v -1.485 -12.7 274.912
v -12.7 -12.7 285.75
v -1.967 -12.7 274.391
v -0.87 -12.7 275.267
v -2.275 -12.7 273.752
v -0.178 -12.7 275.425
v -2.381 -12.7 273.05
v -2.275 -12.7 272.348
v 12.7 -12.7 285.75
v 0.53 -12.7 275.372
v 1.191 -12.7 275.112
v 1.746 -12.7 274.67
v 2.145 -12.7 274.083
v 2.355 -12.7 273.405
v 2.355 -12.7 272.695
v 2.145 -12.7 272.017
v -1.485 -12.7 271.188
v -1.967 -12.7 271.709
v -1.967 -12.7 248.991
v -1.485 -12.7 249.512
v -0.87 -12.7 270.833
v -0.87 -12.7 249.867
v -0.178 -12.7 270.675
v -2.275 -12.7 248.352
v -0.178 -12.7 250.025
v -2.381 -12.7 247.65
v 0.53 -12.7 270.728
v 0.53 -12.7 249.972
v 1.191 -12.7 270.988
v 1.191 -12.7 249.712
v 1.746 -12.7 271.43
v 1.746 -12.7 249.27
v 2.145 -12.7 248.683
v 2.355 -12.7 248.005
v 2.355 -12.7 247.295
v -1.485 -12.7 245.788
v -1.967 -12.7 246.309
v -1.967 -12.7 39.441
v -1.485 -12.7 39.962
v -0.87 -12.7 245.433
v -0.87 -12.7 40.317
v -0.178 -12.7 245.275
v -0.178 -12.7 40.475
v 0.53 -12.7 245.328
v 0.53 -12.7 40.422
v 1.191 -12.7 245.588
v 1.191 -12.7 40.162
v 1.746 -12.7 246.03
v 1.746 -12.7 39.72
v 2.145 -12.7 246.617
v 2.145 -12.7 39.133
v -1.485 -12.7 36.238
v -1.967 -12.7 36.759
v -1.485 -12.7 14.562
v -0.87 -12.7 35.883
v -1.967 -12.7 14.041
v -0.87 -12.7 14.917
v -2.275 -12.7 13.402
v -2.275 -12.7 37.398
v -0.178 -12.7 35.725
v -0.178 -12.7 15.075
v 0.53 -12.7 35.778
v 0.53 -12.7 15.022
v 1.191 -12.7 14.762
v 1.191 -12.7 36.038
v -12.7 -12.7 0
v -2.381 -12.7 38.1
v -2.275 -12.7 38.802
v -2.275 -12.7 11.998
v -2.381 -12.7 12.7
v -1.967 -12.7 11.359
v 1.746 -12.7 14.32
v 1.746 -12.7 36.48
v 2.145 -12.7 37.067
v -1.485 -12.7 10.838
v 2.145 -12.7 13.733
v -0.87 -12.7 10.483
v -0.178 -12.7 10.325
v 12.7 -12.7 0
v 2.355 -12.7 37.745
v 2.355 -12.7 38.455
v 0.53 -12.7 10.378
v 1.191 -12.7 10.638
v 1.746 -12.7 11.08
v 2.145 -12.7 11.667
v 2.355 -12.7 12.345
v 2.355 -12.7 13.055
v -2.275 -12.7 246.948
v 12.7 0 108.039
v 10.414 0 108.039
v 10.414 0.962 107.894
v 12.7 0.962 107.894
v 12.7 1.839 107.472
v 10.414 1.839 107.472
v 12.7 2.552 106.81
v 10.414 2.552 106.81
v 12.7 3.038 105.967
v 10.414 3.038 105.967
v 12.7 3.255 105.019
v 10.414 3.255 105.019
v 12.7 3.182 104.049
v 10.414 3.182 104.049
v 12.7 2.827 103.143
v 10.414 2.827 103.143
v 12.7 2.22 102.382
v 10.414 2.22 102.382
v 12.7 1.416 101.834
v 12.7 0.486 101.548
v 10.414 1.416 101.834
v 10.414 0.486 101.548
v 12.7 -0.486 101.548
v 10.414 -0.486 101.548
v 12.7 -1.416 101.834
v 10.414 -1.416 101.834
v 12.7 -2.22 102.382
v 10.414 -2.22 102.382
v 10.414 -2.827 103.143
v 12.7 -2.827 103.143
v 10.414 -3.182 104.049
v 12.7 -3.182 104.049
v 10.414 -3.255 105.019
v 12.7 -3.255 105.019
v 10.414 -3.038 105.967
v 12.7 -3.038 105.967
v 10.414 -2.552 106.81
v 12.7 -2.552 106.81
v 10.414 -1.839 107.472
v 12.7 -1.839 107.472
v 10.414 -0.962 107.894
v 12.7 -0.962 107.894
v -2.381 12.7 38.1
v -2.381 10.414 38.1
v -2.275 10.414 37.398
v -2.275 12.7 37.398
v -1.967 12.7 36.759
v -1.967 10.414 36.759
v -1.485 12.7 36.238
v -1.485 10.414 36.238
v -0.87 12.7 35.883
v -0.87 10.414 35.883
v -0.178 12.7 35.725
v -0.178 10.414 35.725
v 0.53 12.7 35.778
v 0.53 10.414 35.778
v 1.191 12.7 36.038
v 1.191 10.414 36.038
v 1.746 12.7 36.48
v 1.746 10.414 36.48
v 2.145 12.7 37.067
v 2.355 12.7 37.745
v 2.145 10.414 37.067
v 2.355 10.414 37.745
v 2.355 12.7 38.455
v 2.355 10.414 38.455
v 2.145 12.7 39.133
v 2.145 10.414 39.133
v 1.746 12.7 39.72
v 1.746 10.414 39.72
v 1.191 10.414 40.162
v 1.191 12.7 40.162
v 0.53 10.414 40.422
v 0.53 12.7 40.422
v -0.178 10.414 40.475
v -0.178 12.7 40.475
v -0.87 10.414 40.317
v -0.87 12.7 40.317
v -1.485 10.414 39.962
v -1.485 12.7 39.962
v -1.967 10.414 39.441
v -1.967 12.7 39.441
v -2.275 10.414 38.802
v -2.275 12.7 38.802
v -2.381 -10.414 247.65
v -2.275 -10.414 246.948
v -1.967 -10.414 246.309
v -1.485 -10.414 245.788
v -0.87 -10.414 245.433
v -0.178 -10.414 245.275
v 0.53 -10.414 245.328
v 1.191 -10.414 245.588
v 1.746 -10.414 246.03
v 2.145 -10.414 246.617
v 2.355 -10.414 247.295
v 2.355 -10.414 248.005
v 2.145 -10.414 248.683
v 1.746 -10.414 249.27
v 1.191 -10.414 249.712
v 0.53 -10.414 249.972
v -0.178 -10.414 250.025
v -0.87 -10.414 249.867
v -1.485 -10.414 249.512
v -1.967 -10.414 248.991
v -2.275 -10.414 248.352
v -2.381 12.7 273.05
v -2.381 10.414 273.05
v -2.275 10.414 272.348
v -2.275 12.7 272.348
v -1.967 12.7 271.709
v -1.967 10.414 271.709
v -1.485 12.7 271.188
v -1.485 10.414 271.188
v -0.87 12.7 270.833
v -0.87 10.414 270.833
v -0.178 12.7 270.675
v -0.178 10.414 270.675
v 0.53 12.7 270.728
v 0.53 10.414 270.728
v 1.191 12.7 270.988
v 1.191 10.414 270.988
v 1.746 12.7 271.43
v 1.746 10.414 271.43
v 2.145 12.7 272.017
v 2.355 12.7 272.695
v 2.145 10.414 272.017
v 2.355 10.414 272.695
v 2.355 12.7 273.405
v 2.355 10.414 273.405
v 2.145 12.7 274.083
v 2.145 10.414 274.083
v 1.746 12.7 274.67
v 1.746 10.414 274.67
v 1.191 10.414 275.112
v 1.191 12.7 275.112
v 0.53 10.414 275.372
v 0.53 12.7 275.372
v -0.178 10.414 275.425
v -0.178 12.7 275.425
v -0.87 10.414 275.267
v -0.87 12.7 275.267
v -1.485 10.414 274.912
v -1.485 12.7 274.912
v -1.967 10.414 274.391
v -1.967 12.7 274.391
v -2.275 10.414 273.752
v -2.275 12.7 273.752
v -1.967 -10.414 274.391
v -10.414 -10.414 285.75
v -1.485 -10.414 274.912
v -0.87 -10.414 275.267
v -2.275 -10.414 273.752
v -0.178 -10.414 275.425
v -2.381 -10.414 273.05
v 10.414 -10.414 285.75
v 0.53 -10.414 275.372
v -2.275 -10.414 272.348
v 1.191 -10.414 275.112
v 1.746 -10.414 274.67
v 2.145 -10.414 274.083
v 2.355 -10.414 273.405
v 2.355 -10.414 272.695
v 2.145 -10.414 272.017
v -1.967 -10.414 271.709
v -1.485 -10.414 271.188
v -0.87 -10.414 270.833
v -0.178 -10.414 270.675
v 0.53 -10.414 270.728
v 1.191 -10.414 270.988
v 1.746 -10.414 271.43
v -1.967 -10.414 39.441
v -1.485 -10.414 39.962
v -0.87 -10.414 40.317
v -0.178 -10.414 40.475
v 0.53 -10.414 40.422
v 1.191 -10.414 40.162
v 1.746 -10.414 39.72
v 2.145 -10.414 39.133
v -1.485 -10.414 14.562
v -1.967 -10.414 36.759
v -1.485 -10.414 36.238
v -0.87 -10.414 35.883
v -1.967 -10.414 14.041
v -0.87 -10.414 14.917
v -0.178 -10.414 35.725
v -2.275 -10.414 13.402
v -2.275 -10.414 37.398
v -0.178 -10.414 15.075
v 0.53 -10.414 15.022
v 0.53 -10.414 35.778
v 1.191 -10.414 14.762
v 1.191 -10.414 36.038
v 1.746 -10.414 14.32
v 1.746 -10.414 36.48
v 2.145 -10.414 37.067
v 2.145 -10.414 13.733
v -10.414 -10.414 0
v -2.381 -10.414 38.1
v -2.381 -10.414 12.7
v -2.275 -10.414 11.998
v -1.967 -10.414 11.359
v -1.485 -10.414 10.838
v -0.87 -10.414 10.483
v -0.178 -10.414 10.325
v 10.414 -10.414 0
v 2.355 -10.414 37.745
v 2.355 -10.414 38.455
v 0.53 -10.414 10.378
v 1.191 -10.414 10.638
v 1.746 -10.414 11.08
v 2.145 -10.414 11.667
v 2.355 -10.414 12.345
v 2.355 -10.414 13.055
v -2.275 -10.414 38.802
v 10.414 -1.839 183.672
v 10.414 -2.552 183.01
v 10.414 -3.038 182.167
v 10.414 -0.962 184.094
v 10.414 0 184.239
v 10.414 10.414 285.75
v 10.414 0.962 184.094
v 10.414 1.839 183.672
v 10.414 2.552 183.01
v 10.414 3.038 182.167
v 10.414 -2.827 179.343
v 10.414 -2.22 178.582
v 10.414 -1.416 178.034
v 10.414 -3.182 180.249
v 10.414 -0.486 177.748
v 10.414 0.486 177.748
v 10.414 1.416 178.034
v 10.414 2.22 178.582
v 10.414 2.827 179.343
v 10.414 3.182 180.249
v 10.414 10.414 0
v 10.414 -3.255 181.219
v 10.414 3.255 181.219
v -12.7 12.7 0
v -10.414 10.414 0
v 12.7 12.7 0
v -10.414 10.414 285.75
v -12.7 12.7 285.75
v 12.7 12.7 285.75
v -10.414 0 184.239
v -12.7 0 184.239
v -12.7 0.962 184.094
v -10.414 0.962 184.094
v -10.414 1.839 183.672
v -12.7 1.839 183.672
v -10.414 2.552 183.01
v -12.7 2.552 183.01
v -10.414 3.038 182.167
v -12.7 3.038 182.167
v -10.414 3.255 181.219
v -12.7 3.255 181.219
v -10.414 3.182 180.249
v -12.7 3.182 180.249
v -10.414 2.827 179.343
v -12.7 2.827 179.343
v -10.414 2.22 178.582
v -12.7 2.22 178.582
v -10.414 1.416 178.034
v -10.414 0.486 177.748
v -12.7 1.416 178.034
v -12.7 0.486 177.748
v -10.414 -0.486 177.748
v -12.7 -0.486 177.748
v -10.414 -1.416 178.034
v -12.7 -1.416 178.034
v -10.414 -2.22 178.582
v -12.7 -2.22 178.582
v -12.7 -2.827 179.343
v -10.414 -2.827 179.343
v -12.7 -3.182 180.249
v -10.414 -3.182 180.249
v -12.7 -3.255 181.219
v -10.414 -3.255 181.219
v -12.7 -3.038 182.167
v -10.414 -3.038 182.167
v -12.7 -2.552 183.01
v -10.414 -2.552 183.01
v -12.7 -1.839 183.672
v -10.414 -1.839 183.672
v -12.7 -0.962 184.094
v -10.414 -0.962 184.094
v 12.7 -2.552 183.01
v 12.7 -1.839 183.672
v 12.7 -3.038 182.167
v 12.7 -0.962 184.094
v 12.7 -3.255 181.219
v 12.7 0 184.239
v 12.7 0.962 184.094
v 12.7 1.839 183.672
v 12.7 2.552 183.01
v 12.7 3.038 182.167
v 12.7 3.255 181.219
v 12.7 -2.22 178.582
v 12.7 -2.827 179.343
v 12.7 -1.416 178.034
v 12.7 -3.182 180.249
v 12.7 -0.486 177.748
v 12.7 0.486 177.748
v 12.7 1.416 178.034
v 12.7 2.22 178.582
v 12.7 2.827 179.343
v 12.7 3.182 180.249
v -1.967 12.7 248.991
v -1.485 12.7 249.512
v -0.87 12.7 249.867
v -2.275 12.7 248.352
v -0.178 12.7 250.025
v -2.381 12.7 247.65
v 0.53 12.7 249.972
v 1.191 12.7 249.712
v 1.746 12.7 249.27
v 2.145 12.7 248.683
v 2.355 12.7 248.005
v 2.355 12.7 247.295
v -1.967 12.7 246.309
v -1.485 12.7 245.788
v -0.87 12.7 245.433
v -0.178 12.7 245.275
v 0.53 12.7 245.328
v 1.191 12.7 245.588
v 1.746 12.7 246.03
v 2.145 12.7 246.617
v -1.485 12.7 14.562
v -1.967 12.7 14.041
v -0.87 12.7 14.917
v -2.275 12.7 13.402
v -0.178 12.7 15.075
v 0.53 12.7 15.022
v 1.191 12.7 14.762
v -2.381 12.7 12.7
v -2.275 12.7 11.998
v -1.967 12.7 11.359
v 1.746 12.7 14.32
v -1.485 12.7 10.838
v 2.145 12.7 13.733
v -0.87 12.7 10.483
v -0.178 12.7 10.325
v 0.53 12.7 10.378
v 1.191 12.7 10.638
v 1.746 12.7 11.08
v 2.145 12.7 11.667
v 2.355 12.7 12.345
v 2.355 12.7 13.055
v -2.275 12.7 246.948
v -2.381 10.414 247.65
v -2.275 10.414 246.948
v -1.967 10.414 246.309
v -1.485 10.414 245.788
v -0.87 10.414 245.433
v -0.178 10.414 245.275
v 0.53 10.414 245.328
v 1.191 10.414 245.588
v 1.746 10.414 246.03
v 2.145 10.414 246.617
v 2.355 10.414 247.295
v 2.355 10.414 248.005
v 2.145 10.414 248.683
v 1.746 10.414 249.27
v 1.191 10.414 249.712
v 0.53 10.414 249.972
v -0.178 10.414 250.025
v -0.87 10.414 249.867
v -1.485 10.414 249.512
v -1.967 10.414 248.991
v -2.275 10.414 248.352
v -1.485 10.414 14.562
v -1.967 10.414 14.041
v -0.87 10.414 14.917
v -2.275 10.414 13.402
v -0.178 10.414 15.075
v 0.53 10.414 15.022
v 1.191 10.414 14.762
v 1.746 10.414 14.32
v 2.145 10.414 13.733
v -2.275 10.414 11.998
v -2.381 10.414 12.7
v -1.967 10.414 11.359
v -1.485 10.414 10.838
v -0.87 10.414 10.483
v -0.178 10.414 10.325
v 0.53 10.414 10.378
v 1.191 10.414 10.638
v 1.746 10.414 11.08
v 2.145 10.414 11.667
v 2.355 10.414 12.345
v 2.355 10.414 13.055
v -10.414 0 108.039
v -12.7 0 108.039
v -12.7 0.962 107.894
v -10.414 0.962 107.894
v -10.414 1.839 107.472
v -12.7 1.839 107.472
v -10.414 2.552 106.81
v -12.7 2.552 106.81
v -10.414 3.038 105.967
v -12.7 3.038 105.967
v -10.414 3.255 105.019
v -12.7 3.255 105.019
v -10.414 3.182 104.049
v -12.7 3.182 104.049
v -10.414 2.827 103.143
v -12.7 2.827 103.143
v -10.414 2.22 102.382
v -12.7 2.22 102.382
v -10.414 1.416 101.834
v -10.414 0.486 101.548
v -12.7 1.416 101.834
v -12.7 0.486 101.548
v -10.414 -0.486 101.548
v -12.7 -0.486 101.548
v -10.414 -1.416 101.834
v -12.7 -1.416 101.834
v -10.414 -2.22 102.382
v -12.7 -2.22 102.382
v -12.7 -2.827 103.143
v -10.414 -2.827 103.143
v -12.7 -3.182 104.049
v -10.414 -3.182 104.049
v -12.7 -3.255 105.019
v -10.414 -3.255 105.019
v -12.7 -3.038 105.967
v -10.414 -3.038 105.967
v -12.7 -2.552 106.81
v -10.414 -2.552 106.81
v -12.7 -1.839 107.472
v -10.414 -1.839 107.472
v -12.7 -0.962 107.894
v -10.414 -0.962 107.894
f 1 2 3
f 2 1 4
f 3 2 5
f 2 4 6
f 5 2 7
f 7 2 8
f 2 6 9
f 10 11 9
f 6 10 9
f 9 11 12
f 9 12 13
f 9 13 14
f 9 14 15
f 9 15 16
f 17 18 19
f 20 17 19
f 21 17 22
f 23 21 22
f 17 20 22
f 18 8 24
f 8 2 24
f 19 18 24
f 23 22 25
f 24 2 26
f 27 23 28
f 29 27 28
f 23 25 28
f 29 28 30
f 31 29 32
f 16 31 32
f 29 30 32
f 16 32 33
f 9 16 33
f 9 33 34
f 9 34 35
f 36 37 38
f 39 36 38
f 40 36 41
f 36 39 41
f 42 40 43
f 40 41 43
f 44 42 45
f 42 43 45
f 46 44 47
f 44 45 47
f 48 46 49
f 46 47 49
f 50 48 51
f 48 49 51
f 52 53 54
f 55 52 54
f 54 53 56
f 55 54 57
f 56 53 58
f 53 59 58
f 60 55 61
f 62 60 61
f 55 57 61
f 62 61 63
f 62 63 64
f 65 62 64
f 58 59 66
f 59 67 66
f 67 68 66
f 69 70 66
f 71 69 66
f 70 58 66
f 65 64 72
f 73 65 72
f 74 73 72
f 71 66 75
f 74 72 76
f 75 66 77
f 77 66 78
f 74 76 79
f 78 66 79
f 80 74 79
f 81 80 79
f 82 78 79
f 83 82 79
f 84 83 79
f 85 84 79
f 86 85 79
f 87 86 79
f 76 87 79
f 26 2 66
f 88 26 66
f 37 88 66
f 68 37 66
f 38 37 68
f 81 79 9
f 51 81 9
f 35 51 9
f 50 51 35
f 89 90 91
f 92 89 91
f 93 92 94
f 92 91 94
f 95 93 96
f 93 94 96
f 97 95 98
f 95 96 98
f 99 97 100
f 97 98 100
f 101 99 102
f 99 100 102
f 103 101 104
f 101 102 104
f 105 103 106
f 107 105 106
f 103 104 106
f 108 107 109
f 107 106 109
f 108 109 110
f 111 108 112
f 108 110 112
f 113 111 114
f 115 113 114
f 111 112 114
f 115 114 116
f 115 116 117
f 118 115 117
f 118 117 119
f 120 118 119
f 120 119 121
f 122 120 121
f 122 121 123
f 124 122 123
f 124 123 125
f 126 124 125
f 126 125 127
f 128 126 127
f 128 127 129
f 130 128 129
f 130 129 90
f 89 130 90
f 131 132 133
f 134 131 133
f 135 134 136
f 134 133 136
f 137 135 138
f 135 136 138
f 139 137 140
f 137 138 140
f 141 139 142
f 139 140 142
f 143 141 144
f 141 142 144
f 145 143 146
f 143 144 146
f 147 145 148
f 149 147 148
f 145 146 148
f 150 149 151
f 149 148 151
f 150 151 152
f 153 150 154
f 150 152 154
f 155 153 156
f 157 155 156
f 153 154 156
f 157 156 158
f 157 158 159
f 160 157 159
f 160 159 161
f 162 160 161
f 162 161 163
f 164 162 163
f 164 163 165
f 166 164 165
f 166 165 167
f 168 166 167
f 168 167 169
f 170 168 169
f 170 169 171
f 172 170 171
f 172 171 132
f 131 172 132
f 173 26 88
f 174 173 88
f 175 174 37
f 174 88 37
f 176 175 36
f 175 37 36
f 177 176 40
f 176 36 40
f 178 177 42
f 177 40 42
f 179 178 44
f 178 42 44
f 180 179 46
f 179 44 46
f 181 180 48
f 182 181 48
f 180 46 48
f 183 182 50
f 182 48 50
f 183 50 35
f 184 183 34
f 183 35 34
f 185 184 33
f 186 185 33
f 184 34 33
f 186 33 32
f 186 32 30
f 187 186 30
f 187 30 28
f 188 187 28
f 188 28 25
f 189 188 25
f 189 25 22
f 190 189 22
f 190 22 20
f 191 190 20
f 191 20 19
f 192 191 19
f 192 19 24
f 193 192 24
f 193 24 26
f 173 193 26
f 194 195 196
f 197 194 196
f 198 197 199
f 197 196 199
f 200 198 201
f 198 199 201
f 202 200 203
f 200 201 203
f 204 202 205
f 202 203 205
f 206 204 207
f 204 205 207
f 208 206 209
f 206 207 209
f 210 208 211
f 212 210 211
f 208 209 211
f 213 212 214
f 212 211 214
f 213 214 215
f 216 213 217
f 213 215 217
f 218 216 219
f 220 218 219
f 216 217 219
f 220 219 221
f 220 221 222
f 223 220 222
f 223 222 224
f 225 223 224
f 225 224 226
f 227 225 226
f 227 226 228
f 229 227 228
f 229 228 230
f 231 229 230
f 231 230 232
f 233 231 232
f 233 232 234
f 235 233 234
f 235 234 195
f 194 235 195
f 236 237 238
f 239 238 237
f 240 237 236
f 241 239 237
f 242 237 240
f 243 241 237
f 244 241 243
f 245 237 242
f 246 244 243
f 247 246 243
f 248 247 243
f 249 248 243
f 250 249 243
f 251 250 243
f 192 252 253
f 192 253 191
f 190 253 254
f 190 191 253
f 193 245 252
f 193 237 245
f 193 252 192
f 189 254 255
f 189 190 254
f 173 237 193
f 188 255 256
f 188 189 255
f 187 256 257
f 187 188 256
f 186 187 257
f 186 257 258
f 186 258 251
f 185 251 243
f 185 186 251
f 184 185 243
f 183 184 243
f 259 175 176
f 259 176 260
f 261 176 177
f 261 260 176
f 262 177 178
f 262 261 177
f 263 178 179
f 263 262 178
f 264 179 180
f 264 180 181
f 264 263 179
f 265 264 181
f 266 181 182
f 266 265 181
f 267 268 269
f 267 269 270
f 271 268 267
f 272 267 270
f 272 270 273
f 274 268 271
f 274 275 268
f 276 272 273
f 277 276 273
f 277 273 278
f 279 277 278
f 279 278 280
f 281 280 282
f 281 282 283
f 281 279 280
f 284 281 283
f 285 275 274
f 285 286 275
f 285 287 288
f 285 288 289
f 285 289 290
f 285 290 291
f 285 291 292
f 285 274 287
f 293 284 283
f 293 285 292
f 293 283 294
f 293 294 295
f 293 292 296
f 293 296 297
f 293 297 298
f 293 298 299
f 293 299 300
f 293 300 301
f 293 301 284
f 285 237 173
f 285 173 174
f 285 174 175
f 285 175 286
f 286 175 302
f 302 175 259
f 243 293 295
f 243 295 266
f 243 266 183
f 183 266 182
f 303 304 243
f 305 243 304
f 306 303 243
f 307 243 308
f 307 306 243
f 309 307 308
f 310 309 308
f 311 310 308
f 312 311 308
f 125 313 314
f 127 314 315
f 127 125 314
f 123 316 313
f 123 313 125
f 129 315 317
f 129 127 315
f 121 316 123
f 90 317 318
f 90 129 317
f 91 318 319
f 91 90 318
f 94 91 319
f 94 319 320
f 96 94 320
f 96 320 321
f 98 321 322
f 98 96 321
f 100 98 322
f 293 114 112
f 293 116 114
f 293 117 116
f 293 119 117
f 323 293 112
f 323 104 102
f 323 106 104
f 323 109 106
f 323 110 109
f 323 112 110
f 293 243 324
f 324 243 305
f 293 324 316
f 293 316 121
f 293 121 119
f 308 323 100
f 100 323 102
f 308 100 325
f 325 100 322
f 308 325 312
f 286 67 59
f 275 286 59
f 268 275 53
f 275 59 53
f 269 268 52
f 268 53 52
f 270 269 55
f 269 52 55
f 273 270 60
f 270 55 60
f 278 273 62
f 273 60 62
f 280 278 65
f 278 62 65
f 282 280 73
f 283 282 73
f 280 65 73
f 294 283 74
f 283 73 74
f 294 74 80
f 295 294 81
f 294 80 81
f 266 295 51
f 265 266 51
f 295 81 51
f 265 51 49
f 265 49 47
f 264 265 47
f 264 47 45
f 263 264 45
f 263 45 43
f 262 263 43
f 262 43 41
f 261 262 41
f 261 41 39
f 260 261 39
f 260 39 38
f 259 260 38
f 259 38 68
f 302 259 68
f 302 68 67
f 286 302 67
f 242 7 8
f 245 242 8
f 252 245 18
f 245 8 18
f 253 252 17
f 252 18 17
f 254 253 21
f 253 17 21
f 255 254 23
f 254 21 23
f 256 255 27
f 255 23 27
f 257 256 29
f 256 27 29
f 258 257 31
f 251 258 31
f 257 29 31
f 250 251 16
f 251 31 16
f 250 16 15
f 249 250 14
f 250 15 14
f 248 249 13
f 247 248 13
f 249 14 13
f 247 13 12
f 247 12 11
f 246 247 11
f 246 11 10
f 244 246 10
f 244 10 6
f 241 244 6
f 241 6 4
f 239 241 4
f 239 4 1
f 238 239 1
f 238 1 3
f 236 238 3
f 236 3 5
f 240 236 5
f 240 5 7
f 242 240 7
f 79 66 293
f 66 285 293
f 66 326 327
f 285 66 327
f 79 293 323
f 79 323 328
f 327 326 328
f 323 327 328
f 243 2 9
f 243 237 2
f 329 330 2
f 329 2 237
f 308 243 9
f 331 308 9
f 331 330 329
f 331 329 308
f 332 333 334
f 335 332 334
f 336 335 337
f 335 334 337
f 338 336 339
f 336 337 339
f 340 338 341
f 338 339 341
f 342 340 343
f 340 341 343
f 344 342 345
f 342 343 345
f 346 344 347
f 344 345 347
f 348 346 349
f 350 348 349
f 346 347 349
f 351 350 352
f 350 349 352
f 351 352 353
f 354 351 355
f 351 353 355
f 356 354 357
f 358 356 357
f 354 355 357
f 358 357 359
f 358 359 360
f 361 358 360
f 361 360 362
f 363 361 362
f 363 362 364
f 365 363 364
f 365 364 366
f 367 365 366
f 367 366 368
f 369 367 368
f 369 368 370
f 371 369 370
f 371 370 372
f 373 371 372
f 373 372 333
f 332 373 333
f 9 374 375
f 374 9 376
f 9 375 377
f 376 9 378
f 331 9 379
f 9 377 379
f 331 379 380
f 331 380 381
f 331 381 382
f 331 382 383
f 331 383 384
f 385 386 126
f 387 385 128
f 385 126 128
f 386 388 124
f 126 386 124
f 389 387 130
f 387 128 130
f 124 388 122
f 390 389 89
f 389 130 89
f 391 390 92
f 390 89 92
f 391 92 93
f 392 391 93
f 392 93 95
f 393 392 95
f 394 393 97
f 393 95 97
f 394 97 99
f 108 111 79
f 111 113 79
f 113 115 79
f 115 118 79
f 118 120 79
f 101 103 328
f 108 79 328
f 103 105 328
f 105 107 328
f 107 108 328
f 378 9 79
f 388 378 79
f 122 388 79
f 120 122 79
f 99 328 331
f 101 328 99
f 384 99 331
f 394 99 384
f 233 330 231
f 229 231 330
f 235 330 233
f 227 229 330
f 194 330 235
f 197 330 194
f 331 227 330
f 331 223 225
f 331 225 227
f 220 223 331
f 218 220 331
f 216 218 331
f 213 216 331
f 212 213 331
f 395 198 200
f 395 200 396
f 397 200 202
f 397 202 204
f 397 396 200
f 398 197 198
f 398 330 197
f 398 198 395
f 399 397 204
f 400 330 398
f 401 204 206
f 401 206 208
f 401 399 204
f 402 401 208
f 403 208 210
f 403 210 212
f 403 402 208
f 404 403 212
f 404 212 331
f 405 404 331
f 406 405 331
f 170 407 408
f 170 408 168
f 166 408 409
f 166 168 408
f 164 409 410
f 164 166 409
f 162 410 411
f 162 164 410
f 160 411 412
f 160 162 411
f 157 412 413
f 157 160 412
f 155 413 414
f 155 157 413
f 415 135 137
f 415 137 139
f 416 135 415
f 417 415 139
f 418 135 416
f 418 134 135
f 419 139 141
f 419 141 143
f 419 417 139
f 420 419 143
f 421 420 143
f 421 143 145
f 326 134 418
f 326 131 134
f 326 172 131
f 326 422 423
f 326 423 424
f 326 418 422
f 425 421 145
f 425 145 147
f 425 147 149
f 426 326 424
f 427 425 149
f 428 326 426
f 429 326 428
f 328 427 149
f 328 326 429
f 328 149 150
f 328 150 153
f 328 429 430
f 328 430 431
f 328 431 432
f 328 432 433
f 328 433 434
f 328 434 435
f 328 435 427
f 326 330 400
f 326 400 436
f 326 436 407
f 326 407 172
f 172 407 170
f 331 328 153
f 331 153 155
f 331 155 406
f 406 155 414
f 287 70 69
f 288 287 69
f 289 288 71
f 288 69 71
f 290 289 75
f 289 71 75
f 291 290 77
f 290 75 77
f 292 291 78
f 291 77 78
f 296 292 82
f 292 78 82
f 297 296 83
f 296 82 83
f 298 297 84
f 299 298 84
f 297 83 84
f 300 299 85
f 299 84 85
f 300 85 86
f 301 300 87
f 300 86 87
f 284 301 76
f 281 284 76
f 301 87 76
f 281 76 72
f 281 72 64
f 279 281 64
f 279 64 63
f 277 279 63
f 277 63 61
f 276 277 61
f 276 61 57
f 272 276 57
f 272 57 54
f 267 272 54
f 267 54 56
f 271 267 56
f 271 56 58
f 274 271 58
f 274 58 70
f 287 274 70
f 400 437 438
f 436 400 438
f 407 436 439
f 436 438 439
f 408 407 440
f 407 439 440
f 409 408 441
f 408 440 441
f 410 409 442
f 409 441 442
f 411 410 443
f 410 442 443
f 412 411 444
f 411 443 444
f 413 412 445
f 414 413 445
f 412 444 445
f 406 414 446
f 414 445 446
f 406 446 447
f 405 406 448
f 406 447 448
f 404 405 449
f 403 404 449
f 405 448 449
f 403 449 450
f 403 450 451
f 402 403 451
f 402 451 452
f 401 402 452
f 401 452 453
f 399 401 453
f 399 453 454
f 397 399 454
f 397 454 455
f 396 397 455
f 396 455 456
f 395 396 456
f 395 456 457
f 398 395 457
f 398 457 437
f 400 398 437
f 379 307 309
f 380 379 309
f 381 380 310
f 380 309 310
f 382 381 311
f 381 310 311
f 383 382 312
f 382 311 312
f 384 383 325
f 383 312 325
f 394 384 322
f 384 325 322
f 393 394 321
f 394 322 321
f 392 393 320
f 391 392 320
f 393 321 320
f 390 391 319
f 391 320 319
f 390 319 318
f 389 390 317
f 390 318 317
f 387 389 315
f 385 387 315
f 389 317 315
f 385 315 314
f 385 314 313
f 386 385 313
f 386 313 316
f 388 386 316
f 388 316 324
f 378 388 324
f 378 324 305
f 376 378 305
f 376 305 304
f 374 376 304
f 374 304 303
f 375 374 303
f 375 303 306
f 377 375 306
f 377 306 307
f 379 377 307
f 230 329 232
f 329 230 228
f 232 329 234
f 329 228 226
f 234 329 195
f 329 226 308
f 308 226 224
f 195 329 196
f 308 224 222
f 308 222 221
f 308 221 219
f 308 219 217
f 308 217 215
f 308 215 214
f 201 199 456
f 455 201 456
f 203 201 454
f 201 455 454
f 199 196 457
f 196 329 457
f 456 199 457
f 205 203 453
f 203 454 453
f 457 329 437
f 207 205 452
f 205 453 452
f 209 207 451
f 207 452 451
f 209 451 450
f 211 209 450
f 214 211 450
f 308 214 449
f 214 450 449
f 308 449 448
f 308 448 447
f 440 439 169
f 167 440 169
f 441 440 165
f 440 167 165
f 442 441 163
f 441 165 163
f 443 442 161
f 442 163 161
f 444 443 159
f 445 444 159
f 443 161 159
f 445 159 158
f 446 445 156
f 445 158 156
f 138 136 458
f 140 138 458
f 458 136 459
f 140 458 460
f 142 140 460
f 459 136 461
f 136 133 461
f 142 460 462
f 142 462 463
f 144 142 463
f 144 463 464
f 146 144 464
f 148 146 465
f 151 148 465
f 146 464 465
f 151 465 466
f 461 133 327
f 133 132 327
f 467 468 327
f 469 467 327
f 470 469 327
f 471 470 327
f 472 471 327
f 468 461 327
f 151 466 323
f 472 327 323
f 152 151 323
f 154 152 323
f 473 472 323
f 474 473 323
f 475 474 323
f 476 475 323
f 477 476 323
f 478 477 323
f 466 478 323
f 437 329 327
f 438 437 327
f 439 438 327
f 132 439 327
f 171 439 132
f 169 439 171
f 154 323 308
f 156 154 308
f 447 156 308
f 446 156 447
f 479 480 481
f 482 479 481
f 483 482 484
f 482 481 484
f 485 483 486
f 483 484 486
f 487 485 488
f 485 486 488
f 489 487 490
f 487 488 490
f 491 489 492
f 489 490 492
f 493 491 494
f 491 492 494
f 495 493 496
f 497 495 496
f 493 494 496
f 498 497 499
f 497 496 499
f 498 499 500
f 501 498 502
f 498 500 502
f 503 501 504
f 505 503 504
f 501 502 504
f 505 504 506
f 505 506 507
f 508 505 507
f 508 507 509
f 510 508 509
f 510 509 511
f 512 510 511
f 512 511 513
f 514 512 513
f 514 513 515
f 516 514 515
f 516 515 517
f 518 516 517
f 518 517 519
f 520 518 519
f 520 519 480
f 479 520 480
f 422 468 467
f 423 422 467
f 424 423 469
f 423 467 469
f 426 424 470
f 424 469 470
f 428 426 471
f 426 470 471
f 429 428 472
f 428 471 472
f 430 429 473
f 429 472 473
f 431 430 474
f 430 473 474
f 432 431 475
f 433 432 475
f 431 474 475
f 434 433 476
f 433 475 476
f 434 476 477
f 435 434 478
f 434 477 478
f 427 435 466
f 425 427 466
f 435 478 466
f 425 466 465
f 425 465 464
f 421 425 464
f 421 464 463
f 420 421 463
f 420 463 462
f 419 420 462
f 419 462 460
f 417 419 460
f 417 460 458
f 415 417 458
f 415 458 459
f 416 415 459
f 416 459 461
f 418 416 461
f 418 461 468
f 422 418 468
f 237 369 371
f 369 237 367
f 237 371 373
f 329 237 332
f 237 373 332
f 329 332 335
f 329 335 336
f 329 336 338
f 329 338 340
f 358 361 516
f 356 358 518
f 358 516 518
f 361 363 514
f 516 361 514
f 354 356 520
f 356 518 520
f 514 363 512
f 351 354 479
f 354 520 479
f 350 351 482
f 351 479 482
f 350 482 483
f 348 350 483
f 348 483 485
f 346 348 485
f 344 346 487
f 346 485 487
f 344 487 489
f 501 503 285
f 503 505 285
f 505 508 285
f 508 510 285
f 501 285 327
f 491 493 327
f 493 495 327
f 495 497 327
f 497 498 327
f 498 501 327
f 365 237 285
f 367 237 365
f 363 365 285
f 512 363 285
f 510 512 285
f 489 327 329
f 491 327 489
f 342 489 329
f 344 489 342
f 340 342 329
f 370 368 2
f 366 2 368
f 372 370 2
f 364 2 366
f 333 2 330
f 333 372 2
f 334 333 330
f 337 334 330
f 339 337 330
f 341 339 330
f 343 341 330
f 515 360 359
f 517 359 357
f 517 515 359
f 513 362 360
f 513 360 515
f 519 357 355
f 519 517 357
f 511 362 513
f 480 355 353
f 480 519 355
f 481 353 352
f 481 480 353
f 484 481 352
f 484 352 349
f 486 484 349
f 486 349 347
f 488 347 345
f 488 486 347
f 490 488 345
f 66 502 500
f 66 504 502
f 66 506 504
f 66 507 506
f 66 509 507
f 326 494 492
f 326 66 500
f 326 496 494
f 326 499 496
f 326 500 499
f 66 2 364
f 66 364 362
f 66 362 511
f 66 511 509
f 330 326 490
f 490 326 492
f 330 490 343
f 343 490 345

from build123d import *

# Parameters (mm, degrees)
SKETCH1_W                      = 25.4
SKETCH1_H                      = 25.4
SKETCH1_W_2                    = 20.828
SKETCH1_H_2                    = 20.828
BOSS_EXTRUDE1_DEPTH            = 285.75
F_3_16_0_1875_DIAMETER_HOLE7_D = 4.7625
F_0_257_DIAMETER_HOLE1_D       = 6.5278


with BuildPart() as part:
    # Sketch1 → Boss-Extrude1 (new body)
    with BuildSketch(Plane.XY):
        Rectangle(SKETCH1_W, SKETCH1_H)
        Rectangle(SKETCH1_W_2, SKETCH1_H_2, mode=Mode.SUBTRACT)
    extrude(amount=BOSS_EXTRUDE1_DEPTH)

    # 3/16 (0.1875) Diameter Hole7 (through all)
    with Locations(Plane(origin=(0, 12.7, 0), x_dir=(1, 0, 0), z_dir=(0, 1, 0))):
        with Locations((0, -273.05), (0, -247.65), (0, -12.7), (0, -38.1)):
            Hole(F_3_16_0_1875_DIAMETER_HOLE7_D / 2)

    # F (0.257) Diameter Hole1 (through all)
    with Locations(Plane(origin=(12.7, 0, 0), x_dir=(0, 0, -1), z_dir=(1, 0, 0))):
        with Locations((-180.975, 0), (-104.775, 0)):
            Hole(F_0_257_DIAMETER_HOLE1_D / 2)


solid = part.part
